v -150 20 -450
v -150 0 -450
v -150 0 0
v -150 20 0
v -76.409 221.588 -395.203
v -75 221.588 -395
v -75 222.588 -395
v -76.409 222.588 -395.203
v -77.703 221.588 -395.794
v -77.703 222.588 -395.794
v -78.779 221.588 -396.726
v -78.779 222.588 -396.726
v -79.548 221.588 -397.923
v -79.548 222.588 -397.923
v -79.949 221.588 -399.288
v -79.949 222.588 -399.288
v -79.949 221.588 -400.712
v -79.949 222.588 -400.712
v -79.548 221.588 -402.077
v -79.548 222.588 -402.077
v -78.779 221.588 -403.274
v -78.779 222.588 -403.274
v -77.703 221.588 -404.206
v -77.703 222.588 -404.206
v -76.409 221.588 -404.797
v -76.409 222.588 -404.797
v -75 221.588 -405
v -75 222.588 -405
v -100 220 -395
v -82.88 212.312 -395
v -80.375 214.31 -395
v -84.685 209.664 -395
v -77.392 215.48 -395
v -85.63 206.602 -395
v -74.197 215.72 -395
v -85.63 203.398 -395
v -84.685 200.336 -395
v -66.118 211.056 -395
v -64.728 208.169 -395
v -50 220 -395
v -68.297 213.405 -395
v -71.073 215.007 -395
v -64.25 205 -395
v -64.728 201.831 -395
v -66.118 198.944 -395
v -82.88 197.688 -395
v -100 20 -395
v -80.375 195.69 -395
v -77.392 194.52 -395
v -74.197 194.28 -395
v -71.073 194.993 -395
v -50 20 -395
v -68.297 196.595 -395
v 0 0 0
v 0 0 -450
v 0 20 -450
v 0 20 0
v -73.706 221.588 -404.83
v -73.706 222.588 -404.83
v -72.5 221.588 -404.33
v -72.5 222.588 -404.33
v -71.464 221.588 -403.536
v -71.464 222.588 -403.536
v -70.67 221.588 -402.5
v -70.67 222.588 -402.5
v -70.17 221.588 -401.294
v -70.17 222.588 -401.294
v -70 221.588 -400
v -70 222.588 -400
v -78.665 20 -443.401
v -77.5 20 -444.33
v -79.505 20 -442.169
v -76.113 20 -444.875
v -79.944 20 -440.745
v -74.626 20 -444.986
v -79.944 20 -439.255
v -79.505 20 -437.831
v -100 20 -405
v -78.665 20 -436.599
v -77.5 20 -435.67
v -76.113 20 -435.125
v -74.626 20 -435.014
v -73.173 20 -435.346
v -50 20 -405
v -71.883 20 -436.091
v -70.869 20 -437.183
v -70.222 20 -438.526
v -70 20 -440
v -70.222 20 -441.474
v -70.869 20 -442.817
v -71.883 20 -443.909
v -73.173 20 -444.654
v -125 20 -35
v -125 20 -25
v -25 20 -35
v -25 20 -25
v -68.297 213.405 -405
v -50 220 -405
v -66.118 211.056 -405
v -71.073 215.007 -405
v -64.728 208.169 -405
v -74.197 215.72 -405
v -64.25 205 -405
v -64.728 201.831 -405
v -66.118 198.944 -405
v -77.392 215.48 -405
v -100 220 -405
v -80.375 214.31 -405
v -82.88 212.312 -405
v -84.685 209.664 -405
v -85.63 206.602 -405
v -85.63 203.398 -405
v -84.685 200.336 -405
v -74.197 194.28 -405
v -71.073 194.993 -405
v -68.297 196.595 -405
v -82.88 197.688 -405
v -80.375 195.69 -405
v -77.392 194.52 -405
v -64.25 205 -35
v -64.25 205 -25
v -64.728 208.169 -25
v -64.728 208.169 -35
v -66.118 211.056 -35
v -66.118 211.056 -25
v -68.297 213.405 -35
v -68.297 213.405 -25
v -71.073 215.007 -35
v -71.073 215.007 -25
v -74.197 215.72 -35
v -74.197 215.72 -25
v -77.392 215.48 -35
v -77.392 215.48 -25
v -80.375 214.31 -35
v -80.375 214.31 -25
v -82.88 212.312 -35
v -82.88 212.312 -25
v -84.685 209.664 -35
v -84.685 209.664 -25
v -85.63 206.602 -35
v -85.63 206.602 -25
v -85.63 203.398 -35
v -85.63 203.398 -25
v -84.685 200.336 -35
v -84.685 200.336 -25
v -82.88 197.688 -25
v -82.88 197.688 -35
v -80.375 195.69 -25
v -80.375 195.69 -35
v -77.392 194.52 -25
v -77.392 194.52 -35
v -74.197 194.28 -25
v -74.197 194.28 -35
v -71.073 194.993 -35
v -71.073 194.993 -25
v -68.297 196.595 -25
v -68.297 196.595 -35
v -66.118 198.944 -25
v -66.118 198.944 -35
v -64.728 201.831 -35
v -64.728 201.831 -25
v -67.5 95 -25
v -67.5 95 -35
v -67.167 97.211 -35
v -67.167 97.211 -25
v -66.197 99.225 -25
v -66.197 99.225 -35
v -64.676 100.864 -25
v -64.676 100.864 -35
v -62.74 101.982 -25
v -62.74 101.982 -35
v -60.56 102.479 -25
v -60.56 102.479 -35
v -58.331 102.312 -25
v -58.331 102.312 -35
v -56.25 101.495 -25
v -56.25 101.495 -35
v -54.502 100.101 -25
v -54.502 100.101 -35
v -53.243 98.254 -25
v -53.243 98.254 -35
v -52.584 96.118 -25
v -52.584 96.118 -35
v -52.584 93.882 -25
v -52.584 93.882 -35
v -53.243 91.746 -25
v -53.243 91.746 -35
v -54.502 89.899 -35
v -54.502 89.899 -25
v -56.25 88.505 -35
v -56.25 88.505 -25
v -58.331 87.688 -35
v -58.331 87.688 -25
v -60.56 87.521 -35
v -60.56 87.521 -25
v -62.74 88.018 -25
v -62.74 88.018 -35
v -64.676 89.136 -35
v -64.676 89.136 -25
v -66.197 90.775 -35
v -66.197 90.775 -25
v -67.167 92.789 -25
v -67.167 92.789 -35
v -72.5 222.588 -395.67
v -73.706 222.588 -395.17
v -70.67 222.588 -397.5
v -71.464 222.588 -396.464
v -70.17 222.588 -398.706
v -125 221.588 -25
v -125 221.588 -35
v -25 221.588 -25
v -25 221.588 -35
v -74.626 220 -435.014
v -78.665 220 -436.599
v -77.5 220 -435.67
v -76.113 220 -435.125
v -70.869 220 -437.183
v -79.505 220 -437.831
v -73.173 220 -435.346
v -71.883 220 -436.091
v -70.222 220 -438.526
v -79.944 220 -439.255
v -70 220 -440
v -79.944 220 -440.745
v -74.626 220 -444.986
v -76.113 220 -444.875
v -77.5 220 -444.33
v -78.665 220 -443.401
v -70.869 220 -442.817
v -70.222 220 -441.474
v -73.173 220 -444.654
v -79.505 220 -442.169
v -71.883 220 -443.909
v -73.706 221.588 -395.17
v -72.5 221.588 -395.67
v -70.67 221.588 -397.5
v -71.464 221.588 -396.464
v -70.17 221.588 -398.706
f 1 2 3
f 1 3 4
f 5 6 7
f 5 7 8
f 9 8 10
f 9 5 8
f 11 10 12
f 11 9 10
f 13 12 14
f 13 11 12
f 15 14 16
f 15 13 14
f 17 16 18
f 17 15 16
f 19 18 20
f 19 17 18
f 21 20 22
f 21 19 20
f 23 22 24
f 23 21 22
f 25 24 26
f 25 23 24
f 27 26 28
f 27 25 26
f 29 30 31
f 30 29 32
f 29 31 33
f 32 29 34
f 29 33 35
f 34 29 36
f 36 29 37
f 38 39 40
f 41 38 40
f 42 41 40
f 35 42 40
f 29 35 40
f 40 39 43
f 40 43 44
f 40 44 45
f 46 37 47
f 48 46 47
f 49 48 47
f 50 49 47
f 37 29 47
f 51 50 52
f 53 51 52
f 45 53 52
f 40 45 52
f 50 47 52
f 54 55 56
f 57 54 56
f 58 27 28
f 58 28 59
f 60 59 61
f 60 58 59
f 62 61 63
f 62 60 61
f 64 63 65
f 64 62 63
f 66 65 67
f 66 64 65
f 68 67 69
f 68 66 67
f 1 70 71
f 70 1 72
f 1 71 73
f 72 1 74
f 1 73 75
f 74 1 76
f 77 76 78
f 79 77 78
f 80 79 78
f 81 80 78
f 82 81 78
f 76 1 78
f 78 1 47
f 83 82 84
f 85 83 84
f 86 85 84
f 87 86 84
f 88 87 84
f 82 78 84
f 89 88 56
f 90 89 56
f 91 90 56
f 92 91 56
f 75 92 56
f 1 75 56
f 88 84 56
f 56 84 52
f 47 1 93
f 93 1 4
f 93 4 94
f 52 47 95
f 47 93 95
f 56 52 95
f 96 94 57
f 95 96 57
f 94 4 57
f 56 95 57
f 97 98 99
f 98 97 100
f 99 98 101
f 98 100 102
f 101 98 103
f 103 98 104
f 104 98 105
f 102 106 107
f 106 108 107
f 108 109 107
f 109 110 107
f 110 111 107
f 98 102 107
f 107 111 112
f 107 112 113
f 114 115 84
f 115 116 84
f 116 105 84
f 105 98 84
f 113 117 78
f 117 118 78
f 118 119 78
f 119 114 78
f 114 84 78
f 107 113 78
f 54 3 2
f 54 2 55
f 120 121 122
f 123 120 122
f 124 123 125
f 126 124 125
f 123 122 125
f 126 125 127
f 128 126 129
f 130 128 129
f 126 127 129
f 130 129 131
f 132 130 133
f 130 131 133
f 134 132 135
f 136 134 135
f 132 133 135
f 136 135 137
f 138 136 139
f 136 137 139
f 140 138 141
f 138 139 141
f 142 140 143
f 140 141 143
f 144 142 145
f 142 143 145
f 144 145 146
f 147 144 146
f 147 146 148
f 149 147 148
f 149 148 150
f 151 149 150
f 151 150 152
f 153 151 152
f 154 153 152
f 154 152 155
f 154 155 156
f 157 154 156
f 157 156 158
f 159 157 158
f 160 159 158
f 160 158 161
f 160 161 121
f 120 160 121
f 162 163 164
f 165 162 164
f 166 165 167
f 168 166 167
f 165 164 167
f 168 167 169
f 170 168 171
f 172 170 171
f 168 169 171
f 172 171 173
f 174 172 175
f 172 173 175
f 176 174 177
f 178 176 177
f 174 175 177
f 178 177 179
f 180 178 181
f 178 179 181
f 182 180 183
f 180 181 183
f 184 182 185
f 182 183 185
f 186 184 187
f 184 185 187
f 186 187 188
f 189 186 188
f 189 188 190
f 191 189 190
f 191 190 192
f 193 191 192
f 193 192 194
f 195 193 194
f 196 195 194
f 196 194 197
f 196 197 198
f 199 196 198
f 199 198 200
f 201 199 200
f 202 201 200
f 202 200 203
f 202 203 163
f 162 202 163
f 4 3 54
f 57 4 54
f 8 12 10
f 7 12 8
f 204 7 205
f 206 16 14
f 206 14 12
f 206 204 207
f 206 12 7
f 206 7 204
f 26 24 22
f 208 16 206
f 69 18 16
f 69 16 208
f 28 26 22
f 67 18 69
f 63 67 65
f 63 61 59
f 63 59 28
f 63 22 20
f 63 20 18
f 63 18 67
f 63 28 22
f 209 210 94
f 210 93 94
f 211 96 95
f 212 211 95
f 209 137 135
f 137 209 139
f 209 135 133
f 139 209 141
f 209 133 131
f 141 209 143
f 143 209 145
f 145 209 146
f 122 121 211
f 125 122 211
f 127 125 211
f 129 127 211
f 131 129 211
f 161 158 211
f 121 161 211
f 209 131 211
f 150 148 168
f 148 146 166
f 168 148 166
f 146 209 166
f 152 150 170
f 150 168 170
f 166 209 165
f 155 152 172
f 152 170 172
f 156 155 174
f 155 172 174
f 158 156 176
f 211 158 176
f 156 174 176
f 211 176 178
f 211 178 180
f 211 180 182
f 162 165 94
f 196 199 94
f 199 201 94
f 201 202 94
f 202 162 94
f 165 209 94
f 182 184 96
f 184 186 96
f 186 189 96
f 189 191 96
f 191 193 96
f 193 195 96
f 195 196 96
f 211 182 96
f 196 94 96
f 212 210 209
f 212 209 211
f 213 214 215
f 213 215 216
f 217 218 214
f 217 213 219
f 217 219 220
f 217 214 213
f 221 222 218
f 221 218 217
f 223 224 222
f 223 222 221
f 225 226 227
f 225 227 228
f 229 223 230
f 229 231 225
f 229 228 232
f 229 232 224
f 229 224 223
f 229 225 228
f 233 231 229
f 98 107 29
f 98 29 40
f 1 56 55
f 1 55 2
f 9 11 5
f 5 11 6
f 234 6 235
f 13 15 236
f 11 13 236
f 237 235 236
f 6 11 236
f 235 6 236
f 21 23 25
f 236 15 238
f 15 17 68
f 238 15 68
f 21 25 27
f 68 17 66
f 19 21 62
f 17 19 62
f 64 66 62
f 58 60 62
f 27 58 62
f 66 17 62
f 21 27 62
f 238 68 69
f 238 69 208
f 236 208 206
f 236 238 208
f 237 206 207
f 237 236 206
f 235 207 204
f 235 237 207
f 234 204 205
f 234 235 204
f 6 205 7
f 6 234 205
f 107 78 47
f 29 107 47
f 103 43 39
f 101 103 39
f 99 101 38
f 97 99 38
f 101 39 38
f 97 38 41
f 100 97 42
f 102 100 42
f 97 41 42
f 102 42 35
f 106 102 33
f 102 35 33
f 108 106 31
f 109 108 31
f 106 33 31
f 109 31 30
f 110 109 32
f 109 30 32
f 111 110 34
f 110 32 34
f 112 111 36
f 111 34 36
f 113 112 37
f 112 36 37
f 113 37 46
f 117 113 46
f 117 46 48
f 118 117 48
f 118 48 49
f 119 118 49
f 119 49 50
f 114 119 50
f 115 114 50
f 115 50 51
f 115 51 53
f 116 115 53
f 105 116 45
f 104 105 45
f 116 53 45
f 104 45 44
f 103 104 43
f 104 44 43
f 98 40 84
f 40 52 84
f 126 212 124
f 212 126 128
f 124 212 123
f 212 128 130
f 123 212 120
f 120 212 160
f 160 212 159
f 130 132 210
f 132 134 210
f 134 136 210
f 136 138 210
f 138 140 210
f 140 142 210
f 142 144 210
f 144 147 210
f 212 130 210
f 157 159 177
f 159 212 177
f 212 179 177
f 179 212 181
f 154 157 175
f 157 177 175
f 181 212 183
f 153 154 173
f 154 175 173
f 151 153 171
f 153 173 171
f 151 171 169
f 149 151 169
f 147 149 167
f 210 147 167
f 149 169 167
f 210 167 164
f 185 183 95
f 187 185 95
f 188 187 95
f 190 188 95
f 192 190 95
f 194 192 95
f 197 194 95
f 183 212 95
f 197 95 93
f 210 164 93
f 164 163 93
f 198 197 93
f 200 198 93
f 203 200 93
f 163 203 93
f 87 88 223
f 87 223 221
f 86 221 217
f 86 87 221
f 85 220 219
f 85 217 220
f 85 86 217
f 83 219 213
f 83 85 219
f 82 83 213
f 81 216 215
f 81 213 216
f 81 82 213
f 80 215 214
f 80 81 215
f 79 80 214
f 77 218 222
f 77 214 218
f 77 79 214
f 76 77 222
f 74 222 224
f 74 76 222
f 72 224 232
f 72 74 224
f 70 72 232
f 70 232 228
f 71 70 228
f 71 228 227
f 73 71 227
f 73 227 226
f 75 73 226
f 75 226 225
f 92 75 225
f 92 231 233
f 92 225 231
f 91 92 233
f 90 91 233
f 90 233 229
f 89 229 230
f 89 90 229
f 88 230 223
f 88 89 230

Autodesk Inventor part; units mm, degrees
ref_plane "YZ Plane" through (0, 0, 0) normal (1, 0, 0) x (0, 1, 0)
ref_plane "XZ Plane" through (0, 0, 0) normal (0, 1, 0) x (-1, 0, 0)
ref_plane "XY Plane" through (0, 0, 0) normal (0, 0, 1) x (1, 0, 0)
sketch "Sketch1" plane through (0, 0, 0) normal (0, 1, 0) x (-1, 0, 0)
  line L0 (0, 0) -> (0, -300)
  line L1 (0, -300) -> (150, -300)
  line L2 (150, -300) -> (150, 0)
  line L3 (150, 0) -> (0, 0)
  dimension "d0" = 300
  dimension "d1" = 150
  dimension "d2" = 300
  dimension "d3" = 150
extrude "Extrusion1" add sketch "Sketch1" along normal blind 20
sketch "Sketch2" plane through (0, 20, 0) normal (0, 1, 0) x (1, 0, 0)
  line L0 (-25, 35) -> (-125, 35)
  line L1 (-125, 35) -> (-125, 25)
  line L2 (-125, 25) -> (-25, 25)
  line L3 (-25, 25) -> (-25, 35)
  line L4 (-25, 35) -> (-125, 25) construction
  line L5 (-125, 35) -> (-25, 25) construction
  point P0 (0, 0)
  point P1 (-75, 30)
  dimension "d6" = 100
  dimension "d7" = 10
extrude "Extrusion2" add sketch "Sketch2" along normal blind 201.5875
sketch "Sketch3" plane through (-25, 20, -35) normal (0, 0, -1) x (-1, 0, 0)
  circle A0 centre (35, 75) radius 7.5
  point P0 (-25, -20)
  dimension "d10" = 15
extrude "Extrusion3" cut sketch "Sketch3" against normal blind 200
sketch "Sketch4" plane through (-25, 20, -35) normal (0, 0, -1) x (-1, 0, 0)
  circle A0 centre (50, 185) radius 8.5
  point P0 (-25, -20)
  dimension "d13" = 17
extrude "Extrusion4" cut sketch "Sketch4" against normal blind 15
sketch "Sketch5" plane through (0, 0, -300) normal (0, 0, -1) x (-1, 0, 0)
  line L0 (0, 0) -> (0, 20) projected
  line L1 (0, 20) -> (0, 0)
  line L2 (150, 0) -> (0, 0) projected
  line L3 (0, 0) -> (150, 0)
  line L4 (150, 0) -> (150, 20) projected
  line L5 (150, 0) -> (150, 20)
  line L6 (150, 20) -> (0, 20)
  line L7 (125, 20) -> (25, 20) projected
extrude "Extrusion5" add sketch "Sketch5" along normal blind 150
sketch "Sketch6" plane through (0, 20, 0) normal (0, 1, 0) x (1, 0, 0)
  line L0 (-100, 395) -> (-50, 395)
  line L1 (-50, 395) -> (-50, 405)
  line L2 (-50, 405) -> (-100, 405)
  line L3 (-100, 405) -> (-100, 395)
  line L4 (-100, 395) -> (-50, 405) construction
  line L5 (-50, 395) -> (-100, 405) construction
  point P0 (0, 0)
  point P1 (-75, 400)
  dimension "d18" = 50
  dimension "d19" = 10
extrude "Extrusion6" add sketch "Sketch6" along normal blind 200
sketch "Sketch7" plane through (-100, 20, -395) normal (0, 0, 1) x (1, 0, 0)
  circle A0 centre (25, 185) radius 8.5 projected
  circle A1 centre (25, 185) radius 8.5
  point P0 (100, -20)
  dimension "d22" = 17
extrude "Extrusion7" cut sketch "Sketch7" against normal blind 200
sketch "Sketch8" plane through (0, 221.5875, 0) normal (0, 1, 0) x (1, 0, 0)
  line L0 (-50, 395) -> (-100, 395) projected
  line L1 (-100, 395) -> (-50, 395)
  line L2 (-100, 405) -> (-50, 405) projected
  circle A0 centre (-75, 400) radius 5
  point P0 (0, 0)
  dimension "d25" = 10
extrude "Extrusion8" add sketch "Sketch8" along normal blind 1
sketch "Sketch9" plane through (-125, 20, -25) normal (0, 0, 1) x (1, 0, 0)
  point P0 (125, -20)
sketch "Sketch10" plane through (-125, 20, -25) normal (0, 0, 1) x (1, 0, 0)
  circle A0 centre (50, 185) radius 8.5 projected
  circle A1 centre (50, 185) radius 10.75
  point P0 (125, -20)
  dimension "d28" = 21.5
extrude "Extrusion9" cut sketch "Sketch10" against normal blind 500 contours A0 | A1
sketch "Sketch11" plane through (0, 20, 0) normal (0, 1, 0) x (1, 0, 0)
  circle A0 centre (-75, 400) radius 5 projected
  line L0 (-150, 450) -> (0, 450) projected
  circle A1 centre (-75, 440) radius 5
  point P0 (0, 0)
  dimension "d31" = 10
extrude "Extrusion10" add sketch "Sketch11" along normal blind 200 contours A1
properties part number "LStand" material "PMMA Plastic"
